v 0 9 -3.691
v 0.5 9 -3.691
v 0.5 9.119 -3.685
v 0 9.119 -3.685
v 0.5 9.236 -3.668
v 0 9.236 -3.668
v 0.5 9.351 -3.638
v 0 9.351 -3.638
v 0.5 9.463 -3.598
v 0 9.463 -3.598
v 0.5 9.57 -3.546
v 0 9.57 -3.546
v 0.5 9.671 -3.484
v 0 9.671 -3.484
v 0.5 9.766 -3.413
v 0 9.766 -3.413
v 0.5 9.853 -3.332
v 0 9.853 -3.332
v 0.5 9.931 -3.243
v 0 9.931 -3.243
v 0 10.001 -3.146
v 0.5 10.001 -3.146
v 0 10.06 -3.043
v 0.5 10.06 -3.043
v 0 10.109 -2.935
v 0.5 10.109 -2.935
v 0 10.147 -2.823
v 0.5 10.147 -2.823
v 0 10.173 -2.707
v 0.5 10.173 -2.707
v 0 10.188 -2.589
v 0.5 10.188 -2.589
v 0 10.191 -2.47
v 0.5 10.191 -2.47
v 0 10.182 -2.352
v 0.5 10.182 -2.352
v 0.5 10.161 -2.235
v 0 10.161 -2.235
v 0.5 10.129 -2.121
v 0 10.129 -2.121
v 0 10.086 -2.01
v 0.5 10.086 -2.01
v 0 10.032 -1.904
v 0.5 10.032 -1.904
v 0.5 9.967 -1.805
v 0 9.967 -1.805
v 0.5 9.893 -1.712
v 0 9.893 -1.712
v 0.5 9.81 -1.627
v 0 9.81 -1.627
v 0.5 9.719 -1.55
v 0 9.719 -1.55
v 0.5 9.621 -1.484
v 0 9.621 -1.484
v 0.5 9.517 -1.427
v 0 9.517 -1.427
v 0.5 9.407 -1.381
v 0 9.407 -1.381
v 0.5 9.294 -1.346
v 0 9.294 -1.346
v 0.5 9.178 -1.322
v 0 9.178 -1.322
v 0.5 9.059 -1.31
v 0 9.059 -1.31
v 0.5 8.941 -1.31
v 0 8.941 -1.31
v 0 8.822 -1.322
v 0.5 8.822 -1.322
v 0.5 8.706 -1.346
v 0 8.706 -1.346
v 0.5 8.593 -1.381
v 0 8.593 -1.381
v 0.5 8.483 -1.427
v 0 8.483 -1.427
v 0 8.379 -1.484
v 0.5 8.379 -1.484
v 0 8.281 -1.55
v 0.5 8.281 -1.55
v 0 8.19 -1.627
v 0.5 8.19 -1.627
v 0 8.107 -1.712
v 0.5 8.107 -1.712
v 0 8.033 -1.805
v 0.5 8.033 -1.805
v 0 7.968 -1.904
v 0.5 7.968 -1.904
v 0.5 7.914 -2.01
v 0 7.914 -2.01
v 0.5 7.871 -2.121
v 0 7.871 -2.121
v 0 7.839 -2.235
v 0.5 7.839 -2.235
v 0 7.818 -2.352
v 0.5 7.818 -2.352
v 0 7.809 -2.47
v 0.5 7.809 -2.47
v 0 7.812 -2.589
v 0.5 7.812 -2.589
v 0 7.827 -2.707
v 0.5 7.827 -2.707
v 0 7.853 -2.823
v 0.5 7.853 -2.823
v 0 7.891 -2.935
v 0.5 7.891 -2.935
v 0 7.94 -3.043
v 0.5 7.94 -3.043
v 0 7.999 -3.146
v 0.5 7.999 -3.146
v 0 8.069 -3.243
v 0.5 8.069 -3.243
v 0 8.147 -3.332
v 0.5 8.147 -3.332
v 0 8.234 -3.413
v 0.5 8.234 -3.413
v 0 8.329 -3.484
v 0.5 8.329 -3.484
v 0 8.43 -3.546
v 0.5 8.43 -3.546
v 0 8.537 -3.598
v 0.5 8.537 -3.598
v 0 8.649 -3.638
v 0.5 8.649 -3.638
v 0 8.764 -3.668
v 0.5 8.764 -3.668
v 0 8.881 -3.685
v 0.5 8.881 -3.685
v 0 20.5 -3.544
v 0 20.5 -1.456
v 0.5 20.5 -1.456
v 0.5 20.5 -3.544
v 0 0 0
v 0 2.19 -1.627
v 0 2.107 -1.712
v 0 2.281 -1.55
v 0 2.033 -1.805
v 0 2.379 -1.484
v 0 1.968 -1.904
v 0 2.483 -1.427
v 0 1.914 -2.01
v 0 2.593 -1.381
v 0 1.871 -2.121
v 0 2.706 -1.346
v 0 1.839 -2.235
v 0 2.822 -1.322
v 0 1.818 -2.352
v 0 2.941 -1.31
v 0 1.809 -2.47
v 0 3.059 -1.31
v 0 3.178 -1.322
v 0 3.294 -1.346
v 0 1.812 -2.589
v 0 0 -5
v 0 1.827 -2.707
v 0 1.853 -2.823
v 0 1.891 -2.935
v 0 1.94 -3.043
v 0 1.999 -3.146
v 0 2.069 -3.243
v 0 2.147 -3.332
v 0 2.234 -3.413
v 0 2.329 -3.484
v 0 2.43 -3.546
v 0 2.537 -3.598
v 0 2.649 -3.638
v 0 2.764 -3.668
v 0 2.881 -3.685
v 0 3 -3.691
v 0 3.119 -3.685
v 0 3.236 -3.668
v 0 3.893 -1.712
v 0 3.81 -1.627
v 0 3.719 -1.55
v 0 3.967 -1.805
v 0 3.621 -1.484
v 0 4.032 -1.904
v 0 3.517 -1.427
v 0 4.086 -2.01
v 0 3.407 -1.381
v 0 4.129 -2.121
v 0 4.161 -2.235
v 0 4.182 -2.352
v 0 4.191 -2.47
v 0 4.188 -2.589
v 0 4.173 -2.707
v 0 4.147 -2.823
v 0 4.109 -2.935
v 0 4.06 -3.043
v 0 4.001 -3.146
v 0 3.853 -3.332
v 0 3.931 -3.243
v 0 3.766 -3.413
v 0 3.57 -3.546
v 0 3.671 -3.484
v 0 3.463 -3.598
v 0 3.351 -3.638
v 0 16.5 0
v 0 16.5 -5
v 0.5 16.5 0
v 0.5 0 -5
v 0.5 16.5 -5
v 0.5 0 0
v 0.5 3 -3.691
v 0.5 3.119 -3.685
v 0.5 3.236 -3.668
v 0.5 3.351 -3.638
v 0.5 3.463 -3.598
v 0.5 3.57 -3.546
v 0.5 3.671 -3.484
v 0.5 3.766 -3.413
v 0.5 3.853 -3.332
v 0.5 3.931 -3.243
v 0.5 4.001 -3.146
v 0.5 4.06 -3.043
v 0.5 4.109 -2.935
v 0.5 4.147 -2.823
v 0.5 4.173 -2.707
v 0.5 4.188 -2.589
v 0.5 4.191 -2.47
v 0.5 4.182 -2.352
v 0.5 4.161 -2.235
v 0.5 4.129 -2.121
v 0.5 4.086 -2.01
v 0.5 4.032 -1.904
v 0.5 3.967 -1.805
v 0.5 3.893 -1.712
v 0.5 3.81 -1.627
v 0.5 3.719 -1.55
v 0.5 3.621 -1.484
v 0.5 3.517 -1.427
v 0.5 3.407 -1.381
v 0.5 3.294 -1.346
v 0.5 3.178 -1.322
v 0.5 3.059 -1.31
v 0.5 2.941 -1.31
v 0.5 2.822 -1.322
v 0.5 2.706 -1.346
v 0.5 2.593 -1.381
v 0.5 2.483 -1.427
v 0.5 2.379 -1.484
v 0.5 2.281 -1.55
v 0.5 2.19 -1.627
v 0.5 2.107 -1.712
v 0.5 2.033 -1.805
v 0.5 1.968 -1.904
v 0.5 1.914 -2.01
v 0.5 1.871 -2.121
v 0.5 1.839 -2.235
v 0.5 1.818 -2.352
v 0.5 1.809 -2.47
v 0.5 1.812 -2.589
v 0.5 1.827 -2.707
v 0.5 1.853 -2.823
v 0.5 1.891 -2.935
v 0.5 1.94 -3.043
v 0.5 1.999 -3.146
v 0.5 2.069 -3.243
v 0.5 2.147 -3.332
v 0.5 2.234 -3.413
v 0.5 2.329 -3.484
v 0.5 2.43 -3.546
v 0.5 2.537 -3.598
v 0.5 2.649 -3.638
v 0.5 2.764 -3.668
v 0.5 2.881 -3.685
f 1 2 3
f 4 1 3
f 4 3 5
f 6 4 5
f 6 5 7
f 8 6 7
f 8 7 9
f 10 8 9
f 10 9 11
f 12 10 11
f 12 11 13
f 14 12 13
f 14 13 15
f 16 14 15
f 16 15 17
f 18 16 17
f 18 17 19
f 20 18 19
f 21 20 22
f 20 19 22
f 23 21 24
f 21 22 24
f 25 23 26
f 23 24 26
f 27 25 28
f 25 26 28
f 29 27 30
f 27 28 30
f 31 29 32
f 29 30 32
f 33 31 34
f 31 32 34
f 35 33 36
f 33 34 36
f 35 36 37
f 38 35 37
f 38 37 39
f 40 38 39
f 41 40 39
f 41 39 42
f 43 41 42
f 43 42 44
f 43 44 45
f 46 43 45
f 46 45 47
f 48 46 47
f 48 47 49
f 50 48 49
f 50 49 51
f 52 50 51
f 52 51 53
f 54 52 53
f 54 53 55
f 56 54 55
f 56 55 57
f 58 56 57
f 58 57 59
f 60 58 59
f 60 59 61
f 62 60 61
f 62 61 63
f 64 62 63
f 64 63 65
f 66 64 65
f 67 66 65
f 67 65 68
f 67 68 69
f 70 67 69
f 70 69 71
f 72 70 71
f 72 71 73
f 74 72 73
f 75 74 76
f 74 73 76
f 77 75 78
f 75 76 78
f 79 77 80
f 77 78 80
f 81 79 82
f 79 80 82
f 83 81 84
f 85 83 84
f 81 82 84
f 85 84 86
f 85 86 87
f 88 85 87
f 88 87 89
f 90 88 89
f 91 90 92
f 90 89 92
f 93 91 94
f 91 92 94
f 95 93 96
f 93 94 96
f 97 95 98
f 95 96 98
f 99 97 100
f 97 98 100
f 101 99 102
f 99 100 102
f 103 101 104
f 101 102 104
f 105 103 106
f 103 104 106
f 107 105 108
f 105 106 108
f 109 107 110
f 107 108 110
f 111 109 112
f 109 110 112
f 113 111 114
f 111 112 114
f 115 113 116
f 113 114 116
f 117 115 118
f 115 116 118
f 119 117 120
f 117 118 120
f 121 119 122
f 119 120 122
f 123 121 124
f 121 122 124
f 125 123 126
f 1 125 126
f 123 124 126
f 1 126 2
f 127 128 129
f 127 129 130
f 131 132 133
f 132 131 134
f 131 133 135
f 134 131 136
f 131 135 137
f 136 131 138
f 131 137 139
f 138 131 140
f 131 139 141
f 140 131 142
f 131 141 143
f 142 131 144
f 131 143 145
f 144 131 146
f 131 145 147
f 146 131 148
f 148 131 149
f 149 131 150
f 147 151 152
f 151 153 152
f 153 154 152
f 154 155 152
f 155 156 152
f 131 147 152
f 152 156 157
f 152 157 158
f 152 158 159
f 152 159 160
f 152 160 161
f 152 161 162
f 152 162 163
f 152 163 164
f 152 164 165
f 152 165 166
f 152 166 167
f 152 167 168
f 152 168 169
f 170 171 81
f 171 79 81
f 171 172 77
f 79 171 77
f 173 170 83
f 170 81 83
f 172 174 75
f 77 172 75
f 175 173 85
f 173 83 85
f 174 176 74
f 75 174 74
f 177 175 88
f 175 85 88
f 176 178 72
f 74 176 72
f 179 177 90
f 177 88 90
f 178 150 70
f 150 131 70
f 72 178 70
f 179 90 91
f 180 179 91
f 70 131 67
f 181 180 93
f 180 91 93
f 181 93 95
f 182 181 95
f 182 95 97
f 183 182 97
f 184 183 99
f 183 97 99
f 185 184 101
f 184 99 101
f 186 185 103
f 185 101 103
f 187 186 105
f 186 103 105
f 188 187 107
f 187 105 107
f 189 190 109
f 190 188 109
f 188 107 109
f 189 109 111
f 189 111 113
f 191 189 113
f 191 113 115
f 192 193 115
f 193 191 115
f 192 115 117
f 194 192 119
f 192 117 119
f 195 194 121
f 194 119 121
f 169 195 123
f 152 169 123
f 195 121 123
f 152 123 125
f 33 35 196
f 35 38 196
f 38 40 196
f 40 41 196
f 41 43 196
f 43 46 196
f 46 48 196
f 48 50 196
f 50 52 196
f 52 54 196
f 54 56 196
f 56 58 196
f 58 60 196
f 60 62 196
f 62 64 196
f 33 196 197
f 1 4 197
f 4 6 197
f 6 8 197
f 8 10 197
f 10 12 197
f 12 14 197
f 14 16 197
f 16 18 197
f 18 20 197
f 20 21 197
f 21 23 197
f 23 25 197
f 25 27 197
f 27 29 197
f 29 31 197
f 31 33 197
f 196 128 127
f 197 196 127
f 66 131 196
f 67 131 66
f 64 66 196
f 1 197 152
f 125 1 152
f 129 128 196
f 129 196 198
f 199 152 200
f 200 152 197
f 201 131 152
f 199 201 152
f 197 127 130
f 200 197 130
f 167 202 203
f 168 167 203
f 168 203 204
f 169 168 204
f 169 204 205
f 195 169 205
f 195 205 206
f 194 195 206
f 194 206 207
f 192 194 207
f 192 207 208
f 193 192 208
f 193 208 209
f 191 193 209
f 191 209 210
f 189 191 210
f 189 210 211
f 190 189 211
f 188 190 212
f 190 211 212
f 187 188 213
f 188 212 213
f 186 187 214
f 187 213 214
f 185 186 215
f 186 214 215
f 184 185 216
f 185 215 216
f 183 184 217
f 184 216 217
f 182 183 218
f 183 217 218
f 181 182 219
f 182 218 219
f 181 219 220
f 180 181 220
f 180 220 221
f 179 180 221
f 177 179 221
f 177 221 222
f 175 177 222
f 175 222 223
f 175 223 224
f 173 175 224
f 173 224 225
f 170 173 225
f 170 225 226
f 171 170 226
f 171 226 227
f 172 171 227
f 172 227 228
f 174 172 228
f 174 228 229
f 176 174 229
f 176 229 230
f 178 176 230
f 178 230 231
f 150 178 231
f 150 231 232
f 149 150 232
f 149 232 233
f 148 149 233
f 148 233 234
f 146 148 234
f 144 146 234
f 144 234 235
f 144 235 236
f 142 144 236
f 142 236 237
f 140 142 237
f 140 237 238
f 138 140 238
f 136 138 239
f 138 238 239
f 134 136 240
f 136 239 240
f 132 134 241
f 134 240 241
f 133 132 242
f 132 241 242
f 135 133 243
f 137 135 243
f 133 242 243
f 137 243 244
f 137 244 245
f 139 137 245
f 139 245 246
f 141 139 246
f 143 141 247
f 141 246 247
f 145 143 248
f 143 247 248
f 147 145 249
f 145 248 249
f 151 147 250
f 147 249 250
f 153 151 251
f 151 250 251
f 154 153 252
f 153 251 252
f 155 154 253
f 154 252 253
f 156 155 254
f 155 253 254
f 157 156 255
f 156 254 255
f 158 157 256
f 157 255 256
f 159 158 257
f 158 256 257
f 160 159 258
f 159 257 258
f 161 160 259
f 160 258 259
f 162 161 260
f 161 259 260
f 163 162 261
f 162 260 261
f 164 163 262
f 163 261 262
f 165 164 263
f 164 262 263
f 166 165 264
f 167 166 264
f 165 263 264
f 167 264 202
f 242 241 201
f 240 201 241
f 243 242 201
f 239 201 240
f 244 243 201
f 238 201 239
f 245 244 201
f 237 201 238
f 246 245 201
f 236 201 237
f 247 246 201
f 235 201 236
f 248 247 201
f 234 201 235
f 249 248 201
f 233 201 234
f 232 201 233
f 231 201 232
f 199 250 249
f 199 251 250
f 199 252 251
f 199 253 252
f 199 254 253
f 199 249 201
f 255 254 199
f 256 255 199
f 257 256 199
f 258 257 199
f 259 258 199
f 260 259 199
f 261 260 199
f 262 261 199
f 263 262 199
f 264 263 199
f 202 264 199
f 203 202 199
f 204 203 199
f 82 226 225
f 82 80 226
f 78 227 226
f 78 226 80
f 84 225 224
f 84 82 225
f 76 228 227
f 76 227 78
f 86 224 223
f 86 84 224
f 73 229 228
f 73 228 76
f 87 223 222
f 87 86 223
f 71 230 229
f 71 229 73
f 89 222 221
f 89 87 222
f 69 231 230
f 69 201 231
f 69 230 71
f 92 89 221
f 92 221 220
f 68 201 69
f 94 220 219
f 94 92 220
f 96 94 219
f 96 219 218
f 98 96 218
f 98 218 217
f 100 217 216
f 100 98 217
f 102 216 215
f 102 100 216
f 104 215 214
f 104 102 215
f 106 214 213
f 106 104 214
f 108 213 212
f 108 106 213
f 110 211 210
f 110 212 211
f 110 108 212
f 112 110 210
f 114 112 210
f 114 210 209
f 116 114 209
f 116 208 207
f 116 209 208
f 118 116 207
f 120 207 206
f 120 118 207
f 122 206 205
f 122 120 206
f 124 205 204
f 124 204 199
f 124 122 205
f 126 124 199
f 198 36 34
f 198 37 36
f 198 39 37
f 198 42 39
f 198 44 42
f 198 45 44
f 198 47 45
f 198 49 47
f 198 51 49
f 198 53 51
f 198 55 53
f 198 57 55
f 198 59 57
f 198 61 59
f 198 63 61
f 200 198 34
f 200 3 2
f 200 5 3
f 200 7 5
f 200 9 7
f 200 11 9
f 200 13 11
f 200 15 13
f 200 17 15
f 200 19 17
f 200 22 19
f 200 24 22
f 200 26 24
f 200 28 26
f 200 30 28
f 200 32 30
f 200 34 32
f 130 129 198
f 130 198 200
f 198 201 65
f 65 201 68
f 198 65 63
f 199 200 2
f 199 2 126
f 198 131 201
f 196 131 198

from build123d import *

# Parameters (mm, degrees)
SKETCH_1_W             = 5
SKETCH_1_H             = 20.5
EXTRUDE_1_DEPTH        = 0.5
HOLE_WIZARD_21_D       = 2.38252
CHAMFER_1_SIZE         = 4
CHAMFER_1_SIZE2        = 1.455880937
CHAMFER_1_PART_2_SIZE  = 4
CHAMFER_1_PART_2_SIZE2 = 1.455880937


with BuildPart() as part:
    # Эскиз1 → Бобышка-Вытянуть1 (new body)
    with BuildSketch(Plane(origin=(0, 0, 0), x_dir=(0, 0, -1), z_dir=(1, 0, 0))):
        with Locations((2.5, 10.25)):
            Rectangle(SKETCH_1_W, SKETCH_1_H)
    extrude(amount=EXTRUDE_1_DEPTH)

    # Сверло под метчик  спиральное #21 (through all)
    with Locations(Plane.ZY):
        with Locations((-2.5, 3), (-2.5, 9)):
            Hole(HOLE_WIZARD_21_D / 2)

    # Фаска1
    chamfer_1_edges = [part.edges().sort_by_distance(p)[0] for p in [
        (0.25, 20.5, 0),
    ]]
    chamfer_1_side = [part.faces().sort_by_distance(p)[0] for p in [
        (0.25, 10.25, 0),
    ]]
    chamfer(chamfer_1_edges, length=CHAMFER_1_SIZE, length2=CHAMFER_1_SIZE2, reference=chamfer_1_side[0])

    # Фаска1 part 2
    chamfer_1_part_2_edges = [part.edges().sort_by_distance(p)[0] for p in [
        (0.25, 20.5, -5),
    ]]
    chamfer_1_part_2_side = [part.faces().sort_by_distance(p)[0] for p in [
        (0.25, 10.25, -5),
    ]]
    chamfer(chamfer_1_part_2_edges, length=CHAMFER_1_PART_2_SIZE, length2=CHAMFER_1_PART_2_SIZE2, reference=chamfer_1_part_2_side[0])


solid = part.part
